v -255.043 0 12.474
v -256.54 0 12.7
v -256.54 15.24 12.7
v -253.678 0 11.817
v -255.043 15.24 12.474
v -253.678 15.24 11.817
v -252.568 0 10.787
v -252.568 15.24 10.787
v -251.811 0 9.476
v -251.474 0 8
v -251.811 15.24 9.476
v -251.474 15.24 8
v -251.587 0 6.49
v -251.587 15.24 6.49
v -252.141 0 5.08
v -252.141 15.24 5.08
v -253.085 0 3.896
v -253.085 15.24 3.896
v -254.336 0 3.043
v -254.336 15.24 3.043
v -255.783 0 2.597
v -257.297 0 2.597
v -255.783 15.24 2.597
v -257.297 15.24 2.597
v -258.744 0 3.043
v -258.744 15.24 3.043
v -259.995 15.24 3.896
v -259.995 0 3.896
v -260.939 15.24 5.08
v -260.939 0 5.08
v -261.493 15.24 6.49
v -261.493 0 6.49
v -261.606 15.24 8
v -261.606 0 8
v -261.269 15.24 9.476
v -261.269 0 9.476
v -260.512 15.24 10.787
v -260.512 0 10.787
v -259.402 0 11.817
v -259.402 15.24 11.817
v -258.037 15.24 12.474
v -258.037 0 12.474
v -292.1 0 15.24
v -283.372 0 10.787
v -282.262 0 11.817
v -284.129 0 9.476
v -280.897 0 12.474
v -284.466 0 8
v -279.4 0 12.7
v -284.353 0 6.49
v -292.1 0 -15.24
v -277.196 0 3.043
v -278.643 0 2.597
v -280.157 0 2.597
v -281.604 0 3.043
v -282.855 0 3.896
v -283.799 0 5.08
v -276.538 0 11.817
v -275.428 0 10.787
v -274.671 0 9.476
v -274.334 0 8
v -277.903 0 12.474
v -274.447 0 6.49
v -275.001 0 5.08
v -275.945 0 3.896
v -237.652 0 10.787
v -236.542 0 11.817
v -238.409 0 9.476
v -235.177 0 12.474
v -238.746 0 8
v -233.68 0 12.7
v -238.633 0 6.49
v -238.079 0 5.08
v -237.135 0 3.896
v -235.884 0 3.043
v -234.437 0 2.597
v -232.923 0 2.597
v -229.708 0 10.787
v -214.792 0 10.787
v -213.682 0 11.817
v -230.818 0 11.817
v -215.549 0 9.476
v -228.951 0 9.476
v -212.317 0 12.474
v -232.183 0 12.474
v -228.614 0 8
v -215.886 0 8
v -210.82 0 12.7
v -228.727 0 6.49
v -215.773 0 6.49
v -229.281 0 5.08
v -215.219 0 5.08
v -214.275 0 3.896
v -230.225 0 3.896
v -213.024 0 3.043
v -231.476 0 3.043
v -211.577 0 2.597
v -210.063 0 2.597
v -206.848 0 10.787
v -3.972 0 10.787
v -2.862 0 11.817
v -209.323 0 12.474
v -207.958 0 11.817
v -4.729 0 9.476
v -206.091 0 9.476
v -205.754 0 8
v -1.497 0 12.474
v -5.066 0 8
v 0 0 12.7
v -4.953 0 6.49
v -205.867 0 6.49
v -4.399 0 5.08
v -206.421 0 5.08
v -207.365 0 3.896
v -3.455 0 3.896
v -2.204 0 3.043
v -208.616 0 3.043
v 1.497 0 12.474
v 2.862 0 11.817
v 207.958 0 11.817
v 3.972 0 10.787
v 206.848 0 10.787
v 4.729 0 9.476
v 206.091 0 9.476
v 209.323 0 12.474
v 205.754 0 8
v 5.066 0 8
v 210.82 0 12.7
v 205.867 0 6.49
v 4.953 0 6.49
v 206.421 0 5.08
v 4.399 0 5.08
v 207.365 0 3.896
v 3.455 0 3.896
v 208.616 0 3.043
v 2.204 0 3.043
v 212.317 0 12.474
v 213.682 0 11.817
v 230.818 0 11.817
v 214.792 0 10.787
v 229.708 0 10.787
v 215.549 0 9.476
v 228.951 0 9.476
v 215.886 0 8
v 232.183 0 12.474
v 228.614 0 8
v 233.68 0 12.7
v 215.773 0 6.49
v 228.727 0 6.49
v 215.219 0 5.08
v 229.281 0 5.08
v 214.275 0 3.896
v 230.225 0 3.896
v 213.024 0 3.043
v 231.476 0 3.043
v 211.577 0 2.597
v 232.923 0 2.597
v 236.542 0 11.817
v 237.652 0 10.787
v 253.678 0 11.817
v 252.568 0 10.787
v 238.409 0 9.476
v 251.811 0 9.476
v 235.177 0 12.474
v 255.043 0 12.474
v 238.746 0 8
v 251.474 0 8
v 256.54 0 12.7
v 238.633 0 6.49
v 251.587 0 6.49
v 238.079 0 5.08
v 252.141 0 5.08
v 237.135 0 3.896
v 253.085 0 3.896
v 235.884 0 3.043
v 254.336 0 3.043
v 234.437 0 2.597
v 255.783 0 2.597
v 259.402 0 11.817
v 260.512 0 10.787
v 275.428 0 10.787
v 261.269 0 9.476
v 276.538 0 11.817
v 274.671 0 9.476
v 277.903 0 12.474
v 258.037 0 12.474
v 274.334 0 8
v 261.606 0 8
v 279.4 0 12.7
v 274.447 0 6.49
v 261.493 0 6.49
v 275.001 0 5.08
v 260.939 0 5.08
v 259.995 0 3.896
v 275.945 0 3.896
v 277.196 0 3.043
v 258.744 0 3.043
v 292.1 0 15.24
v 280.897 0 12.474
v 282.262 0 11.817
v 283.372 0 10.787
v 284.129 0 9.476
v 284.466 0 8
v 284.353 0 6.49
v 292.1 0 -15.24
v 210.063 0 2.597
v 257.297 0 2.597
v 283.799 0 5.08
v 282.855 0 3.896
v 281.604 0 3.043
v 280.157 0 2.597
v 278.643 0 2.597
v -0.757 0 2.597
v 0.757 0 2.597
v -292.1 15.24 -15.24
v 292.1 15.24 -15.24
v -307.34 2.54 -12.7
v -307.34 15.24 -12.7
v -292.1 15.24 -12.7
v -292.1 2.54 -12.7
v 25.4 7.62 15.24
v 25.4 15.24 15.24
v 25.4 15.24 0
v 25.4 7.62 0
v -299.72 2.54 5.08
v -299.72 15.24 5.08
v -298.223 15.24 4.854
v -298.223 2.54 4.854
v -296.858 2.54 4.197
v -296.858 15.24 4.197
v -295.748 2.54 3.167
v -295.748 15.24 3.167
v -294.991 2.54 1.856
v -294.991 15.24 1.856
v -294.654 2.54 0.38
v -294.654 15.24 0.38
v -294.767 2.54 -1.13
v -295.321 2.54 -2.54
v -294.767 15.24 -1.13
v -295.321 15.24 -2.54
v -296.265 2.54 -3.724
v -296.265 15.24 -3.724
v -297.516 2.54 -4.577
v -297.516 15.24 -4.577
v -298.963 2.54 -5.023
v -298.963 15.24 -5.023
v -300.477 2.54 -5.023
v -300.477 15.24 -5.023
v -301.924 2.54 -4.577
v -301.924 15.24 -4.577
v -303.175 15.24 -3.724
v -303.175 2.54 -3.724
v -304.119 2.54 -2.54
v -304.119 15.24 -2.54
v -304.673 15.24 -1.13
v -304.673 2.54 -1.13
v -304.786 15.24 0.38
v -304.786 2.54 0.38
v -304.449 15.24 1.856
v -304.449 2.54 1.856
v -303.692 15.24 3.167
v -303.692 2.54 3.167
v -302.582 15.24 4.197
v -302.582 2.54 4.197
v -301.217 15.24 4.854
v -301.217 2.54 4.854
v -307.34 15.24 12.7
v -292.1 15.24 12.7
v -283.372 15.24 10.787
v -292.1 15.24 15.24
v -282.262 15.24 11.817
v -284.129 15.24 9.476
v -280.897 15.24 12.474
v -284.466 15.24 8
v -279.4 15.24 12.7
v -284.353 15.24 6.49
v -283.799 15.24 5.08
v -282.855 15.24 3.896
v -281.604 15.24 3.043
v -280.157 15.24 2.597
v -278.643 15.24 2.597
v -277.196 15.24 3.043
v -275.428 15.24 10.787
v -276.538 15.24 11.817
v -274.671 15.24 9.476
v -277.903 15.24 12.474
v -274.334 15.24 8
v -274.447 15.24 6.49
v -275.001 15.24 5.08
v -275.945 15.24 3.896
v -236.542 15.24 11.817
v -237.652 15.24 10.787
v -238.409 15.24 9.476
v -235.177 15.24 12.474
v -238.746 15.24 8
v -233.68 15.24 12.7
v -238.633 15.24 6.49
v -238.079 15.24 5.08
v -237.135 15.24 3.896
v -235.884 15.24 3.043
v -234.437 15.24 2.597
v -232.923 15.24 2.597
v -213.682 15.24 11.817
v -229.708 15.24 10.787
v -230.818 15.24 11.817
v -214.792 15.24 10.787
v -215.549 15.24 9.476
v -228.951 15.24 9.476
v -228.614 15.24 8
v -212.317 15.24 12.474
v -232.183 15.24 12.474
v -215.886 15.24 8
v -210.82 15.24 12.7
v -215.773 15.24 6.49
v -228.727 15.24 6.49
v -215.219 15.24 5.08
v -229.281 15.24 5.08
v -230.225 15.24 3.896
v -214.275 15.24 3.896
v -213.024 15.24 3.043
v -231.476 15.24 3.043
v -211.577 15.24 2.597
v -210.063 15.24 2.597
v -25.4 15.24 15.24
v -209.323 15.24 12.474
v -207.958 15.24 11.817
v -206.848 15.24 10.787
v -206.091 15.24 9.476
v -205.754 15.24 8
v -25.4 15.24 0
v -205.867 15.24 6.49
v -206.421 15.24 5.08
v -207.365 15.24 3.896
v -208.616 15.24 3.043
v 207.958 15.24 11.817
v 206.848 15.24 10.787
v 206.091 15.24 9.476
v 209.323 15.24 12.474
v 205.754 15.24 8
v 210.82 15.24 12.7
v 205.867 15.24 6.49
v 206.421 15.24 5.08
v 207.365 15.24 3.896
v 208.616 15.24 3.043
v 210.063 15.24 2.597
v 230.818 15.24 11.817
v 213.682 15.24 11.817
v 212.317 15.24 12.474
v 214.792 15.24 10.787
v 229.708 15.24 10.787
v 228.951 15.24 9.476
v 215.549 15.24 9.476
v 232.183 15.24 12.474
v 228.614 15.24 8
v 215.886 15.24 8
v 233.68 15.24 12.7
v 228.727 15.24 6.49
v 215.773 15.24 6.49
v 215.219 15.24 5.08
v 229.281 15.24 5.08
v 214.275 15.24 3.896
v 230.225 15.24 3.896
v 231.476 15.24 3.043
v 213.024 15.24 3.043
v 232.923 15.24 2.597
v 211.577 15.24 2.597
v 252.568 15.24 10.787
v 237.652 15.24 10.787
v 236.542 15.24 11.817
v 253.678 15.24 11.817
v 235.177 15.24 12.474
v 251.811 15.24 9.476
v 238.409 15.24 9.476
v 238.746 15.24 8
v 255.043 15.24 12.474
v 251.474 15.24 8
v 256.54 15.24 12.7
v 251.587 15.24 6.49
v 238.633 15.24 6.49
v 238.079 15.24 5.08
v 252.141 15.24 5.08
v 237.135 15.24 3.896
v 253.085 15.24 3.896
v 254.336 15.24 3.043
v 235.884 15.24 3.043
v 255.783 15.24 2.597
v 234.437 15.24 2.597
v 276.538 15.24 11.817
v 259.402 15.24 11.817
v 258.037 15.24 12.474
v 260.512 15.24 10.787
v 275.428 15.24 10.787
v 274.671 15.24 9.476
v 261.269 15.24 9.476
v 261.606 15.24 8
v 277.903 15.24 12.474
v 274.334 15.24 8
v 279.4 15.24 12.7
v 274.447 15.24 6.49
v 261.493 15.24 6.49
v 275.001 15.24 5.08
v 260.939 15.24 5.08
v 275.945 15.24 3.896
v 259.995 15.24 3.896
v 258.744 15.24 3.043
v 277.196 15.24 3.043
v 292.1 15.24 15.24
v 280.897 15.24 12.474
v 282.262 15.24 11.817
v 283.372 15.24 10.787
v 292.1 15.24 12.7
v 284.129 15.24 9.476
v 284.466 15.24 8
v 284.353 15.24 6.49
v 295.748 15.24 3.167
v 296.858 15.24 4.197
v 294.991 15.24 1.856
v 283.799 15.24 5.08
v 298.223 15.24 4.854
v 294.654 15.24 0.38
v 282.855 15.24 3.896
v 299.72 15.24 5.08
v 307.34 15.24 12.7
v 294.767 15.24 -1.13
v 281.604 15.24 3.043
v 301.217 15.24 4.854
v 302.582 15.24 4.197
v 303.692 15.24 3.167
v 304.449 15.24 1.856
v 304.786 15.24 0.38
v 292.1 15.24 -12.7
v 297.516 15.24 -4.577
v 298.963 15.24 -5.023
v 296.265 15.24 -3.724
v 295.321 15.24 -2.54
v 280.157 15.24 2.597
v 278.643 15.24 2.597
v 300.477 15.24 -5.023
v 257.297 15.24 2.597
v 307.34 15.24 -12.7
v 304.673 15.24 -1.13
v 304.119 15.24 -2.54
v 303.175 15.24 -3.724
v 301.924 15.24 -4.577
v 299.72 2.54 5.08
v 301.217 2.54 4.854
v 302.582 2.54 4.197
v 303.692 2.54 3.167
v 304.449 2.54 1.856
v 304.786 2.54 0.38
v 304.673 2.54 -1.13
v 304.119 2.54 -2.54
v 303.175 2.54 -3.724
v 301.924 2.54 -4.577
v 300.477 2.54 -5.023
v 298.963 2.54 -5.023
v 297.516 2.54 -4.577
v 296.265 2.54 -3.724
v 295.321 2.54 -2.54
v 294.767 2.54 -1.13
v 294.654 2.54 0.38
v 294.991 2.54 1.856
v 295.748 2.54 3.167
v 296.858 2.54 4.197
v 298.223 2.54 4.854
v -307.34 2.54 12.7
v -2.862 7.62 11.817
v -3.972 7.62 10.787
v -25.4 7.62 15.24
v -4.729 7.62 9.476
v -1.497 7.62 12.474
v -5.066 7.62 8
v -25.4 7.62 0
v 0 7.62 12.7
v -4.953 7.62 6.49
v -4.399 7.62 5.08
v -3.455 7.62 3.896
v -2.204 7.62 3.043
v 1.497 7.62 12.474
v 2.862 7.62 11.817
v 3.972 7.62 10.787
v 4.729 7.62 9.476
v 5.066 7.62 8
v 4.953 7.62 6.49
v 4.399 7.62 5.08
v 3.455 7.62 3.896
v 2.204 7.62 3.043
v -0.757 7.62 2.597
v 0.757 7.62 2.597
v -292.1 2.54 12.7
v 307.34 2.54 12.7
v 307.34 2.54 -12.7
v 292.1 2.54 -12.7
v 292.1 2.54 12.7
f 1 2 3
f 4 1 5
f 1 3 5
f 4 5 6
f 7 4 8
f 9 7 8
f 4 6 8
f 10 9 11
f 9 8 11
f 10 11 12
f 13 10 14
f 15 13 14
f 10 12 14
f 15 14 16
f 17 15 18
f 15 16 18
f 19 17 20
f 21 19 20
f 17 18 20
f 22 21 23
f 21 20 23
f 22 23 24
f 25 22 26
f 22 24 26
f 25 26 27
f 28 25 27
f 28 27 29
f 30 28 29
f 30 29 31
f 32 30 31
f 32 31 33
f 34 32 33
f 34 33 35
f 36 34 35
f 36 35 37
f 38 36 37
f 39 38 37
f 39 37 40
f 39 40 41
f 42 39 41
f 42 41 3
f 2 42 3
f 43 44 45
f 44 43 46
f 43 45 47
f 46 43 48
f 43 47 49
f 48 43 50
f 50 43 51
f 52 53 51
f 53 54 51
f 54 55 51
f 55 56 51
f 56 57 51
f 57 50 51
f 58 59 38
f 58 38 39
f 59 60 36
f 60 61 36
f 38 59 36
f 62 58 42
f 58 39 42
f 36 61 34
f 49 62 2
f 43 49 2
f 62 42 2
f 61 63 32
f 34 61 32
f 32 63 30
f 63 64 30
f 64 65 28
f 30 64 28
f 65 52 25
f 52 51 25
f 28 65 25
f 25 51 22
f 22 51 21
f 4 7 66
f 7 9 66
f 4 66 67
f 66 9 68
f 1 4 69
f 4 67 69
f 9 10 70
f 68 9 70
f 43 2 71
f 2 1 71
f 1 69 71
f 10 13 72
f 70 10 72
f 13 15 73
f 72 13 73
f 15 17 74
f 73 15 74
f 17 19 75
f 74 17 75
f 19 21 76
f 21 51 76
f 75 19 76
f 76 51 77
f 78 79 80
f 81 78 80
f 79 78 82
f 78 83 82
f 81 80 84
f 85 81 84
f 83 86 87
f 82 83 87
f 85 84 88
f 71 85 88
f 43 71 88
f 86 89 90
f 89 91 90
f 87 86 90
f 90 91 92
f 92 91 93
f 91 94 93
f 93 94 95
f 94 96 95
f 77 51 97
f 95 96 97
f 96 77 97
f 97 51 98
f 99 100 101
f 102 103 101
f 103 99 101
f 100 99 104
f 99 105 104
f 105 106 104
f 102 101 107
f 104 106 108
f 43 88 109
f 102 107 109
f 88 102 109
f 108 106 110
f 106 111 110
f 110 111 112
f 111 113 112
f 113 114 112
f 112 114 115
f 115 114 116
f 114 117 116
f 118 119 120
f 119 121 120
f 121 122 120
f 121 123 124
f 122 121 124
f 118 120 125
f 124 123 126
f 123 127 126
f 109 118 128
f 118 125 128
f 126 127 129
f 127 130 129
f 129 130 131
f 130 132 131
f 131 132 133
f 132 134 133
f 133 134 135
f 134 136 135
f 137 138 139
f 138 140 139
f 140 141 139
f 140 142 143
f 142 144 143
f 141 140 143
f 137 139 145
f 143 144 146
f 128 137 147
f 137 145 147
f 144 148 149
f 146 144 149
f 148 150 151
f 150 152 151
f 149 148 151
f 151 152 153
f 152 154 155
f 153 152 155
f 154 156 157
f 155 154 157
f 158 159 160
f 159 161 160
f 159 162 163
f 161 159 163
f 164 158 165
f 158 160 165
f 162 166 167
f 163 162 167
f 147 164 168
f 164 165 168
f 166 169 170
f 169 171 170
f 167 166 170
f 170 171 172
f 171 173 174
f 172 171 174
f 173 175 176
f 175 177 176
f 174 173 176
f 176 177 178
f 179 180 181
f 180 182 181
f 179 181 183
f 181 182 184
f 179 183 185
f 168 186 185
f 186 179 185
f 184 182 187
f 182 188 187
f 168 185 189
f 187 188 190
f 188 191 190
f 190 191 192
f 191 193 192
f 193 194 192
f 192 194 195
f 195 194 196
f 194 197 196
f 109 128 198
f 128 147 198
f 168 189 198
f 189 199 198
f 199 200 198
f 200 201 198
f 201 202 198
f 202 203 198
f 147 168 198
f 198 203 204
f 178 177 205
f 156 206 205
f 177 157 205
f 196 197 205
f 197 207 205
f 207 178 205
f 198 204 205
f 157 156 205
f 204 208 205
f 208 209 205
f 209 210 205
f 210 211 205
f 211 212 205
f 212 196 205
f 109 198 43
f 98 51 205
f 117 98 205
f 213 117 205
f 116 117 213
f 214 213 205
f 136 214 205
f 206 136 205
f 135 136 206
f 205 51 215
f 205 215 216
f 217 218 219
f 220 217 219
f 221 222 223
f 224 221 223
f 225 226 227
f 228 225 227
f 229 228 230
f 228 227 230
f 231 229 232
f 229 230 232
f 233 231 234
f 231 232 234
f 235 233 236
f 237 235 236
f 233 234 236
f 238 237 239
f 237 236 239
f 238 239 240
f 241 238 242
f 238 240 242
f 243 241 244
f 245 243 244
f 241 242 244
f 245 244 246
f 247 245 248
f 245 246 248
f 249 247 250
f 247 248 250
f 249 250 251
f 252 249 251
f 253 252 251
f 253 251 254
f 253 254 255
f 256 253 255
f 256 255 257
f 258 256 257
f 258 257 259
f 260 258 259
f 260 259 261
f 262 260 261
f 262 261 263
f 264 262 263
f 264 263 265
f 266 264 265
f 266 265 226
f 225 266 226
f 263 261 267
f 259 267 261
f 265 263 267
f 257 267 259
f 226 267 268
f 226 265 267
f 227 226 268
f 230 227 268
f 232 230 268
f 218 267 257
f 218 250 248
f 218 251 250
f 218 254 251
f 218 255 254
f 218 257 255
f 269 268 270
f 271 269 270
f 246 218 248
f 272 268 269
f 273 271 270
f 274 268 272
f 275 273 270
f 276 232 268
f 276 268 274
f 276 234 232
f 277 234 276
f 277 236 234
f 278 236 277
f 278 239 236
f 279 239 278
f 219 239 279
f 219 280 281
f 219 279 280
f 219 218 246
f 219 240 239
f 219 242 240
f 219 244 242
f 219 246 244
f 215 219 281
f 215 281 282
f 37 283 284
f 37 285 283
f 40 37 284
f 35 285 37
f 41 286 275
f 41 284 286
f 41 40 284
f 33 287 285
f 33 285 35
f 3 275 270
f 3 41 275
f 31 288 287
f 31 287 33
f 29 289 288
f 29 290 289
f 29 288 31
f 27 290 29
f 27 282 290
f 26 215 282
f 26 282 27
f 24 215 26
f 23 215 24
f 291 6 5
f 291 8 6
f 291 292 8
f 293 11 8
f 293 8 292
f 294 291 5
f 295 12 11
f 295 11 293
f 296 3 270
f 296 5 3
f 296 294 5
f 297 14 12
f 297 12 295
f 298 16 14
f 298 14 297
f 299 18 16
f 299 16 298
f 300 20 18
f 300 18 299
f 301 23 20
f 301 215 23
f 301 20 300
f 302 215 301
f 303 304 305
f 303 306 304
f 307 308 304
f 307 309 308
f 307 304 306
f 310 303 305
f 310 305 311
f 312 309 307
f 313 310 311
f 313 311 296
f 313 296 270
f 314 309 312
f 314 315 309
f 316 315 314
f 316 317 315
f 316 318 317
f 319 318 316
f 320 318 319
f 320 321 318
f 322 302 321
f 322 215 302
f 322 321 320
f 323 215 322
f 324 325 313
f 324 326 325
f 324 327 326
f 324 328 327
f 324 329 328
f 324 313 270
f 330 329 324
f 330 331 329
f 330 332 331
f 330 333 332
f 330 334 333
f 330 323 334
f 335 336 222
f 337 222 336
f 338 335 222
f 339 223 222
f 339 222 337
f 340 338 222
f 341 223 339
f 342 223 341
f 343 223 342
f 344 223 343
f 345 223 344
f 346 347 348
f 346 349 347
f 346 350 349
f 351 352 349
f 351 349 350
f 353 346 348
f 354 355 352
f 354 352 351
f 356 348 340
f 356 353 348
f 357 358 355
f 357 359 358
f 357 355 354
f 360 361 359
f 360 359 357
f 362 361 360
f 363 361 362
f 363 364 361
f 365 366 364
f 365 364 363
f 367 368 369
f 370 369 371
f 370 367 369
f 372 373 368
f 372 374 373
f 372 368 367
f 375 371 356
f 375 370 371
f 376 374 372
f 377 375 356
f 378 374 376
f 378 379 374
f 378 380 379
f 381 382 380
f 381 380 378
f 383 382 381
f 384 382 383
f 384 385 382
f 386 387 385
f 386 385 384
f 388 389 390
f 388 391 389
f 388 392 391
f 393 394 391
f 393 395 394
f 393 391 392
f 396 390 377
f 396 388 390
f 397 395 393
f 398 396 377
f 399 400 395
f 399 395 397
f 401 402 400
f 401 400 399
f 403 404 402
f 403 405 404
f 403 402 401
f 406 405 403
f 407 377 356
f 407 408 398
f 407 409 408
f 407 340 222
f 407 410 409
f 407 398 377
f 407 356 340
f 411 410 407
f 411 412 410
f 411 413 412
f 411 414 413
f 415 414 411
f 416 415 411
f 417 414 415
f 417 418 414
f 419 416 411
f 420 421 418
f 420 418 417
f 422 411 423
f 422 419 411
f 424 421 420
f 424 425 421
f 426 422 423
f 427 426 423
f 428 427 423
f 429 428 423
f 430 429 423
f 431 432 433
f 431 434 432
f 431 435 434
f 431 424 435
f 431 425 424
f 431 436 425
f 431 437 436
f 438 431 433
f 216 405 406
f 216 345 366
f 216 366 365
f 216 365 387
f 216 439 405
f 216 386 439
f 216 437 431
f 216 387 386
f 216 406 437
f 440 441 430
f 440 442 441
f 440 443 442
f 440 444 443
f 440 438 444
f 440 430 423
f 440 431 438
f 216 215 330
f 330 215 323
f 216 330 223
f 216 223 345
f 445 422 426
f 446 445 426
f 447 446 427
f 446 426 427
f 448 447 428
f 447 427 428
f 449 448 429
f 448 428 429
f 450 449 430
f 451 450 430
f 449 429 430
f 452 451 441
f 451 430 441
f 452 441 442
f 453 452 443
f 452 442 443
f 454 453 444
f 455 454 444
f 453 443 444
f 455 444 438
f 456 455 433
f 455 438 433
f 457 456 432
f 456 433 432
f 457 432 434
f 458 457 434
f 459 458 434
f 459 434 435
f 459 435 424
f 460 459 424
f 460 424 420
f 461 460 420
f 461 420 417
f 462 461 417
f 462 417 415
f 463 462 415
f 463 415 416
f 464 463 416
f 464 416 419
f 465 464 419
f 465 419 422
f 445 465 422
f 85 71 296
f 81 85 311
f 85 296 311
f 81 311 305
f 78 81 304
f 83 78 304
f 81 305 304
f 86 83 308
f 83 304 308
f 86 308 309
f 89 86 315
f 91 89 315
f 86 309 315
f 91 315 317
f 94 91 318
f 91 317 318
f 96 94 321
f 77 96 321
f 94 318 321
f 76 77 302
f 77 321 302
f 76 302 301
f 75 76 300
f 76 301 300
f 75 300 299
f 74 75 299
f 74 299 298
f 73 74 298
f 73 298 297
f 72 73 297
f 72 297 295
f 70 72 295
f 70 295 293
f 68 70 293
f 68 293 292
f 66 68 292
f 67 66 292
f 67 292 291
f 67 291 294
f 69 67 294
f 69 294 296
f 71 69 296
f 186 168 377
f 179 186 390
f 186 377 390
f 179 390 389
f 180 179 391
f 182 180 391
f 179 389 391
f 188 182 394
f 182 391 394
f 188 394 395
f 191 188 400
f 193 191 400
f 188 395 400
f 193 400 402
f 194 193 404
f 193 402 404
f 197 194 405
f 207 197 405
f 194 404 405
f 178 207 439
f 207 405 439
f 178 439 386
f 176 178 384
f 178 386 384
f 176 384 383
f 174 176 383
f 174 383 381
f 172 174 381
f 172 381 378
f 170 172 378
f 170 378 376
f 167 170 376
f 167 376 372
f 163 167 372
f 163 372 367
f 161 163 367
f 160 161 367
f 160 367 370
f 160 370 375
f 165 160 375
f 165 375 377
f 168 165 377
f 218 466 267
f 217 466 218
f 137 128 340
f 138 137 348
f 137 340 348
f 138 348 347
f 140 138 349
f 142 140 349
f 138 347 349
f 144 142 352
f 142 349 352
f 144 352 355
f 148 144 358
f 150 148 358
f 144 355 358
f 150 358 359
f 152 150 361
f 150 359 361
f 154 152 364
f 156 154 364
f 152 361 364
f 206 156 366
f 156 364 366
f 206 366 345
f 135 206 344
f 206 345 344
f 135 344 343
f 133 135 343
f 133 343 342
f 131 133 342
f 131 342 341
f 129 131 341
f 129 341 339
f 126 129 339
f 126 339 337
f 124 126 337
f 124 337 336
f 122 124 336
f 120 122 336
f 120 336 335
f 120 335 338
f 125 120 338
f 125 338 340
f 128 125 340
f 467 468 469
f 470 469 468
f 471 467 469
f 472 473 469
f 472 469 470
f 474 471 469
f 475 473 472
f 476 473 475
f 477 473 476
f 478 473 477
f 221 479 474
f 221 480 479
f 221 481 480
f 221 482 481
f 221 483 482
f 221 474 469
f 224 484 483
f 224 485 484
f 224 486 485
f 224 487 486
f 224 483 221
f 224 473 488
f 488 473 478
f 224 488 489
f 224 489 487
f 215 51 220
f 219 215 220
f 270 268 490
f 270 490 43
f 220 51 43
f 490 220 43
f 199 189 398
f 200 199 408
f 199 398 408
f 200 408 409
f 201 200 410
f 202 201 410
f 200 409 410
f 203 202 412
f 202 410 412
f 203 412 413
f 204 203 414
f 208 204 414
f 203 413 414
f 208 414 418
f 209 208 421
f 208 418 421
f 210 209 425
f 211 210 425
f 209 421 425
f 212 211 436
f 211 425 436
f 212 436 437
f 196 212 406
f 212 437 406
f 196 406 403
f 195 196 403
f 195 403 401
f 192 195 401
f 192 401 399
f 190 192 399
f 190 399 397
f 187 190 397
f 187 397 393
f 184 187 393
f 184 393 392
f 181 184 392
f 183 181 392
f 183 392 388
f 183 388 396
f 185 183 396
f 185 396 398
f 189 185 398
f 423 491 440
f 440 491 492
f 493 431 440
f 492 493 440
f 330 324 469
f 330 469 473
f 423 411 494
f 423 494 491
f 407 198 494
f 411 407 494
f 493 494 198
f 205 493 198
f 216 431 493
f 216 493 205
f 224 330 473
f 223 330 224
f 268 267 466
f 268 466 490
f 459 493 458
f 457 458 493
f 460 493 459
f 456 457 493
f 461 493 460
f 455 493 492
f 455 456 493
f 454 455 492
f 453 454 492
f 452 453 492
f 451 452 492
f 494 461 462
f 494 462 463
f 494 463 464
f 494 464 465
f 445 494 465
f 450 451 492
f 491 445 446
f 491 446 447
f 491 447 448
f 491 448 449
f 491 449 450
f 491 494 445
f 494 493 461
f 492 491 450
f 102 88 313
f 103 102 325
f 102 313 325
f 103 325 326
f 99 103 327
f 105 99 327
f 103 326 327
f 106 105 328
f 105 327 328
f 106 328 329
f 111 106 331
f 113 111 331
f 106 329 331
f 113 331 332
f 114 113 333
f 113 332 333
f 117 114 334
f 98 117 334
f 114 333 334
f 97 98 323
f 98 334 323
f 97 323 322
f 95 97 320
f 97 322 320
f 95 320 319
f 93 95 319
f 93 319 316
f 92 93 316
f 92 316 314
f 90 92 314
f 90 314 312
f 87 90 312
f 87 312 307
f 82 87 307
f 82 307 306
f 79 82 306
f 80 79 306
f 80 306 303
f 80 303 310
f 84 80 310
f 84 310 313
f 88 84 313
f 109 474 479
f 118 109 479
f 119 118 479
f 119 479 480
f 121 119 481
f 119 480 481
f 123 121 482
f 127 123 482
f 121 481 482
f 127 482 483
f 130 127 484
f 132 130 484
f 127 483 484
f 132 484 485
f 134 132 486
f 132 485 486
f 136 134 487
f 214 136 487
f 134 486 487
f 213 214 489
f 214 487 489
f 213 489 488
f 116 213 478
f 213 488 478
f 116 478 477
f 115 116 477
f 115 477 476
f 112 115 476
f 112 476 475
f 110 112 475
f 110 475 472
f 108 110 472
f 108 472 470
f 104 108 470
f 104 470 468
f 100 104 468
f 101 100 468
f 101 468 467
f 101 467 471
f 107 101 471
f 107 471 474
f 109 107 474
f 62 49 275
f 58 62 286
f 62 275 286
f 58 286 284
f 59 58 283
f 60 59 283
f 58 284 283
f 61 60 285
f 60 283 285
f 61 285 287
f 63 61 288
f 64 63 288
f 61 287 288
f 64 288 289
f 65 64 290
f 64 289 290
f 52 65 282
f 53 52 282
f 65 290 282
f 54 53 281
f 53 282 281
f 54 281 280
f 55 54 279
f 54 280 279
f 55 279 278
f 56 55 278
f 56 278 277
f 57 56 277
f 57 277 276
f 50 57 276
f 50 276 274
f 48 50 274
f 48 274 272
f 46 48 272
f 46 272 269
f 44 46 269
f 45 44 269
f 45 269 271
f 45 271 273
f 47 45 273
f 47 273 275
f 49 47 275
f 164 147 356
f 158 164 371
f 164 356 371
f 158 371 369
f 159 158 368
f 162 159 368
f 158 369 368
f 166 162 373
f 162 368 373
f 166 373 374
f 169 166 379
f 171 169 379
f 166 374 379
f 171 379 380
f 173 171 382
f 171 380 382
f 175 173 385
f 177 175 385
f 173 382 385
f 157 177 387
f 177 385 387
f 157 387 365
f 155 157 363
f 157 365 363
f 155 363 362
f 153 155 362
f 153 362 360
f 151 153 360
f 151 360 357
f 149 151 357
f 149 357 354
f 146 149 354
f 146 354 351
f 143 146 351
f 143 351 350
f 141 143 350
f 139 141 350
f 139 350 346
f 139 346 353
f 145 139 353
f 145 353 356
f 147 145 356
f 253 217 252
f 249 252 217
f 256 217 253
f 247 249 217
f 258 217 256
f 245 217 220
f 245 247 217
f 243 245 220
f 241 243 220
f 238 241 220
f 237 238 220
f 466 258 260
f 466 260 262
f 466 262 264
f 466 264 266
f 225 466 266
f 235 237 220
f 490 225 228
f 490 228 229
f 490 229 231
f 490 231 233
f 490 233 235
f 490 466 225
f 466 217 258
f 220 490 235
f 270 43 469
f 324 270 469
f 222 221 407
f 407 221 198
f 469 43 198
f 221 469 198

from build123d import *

# Parameters (mm, degrees)
SKETCH1_W           = 614.68
SKETCH1_H           = 30.48
BOSS_EXTRUDE1_DEPTH = 15.24
SKETCH2_W           = 15.24
SKETCH2_H           = 2.54
CUT_EXTRUDE1_DEPTH  = 15.24
SKETCH3_W           = 15.24
SKETCH3_H           = 25.4
CUT_EXTRUDE2_DEPTH  = 2.54
SKETCH4_R           = 5.08
CUT_EXTRUDE3_DEPTH  = 17.78
SKETCH5_W           = 50.8
SKETCH5_H           = 15.24
CUT_EXTRUDE4_DEPTH  = 7.62
SKETCH6_R           = 5.08
CUT_EXTRUDE5_DEPTH  = 12.7
SKETCH7_R           = 5.08
CUT_EXTRUDE6_DEPTH  = 17.78


with BuildPart() as part:
    # Sketch1 → Boss-Extrude1 (new body)
    with BuildSketch(Plane(origin=(0, 0, 0), x_dir=(1, 0, 0), z_dir=(0, 1, 0))):
        Rectangle(SKETCH1_W, SKETCH1_H)
    extrude(amount=BOSS_EXTRUDE1_DEPTH)

    # Sketch2 → Cut-Extrude1 (cut)
    with BuildSketch(Plane(origin=(0, 15.24, 0), x_dir=(1, 0, 0), z_dir=(0, 1, 0))):
        with Locations((-299.72, 13.97)):
            Rectangle(SKETCH2_W, SKETCH2_H)
        with Locations((-299.72, -13.97)):
            Rectangle(SKETCH2_W, SKETCH2_H)
        with Locations((299.72, 13.97)):
            Rectangle(SKETCH2_W, SKETCH2_H)
        with Locations((299.72, -13.97)):
            Rectangle(SKETCH2_W, SKETCH2_H)
    extrude(amount=-CUT_EXTRUDE1_DEPTH, mode=Mode.SUBTRACT)

    # Sketch3 → Cut-Extrude2 (cut)
    with BuildSketch(Plane.XZ):
        with Locations((299.72, 0)):
            Rectangle(SKETCH3_W, SKETCH3_H)
        with Locations((-299.72, 0)):
            Rectangle(SKETCH3_W, SKETCH3_H)
    extrude(amount=-CUT_EXTRUDE2_DEPTH, mode=Mode.SUBTRACT)

    # Sketch4 → Cut-Extrude3 (cut)
    with BuildSketch(Plane(origin=(0, 15.24, 0), x_dir=(1, 0, 0), z_dir=(0, 1, 0))):
        with Locations(Location((-299.72, 0, 0), (0, 0, 270))):
            Circle(SKETCH4_R)
        with Locations(Location((299.72, 0, 0), (0, 0, 270))):
            Circle(SKETCH4_R)
    extrude(amount=-CUT_EXTRUDE3_DEPTH, mode=Mode.SUBTRACT)

    # Sketch5 → Cut-Extrude4 (cut)
    with BuildSketch(Plane(origin=(0, 15.24, 0), x_dir=(1, 0, 0), z_dir=(0, 1, 0))):
        with Locations((0, -7.62)):
            Rectangle(SKETCH5_W, SKETCH5_H)
    extrude(amount=-CUT_EXTRUDE4_DEPTH, mode=Mode.SUBTRACT)

    # Sketch6 → Cut-Extrude5 (cut)
    with BuildSketch(Plane(origin=(0, 7.62, 0), x_dir=(1, 0, 0), z_dir=(0, 1, 0))):
        with Locations(Location((0, -7.62, 0), (0, 0, 270))):
            Circle(SKETCH6_R)
    extrude(amount=-CUT_EXTRUDE5_DEPTH, mode=Mode.SUBTRACT)

    # Sketch7 → Cut-Extrude6 (cut)
    with BuildSketch(Plane(origin=(0, 15.24, 0), x_dir=(1, 0, 0), z_dir=(0, 1, 0))):
        with Locations(Location((-279.4, -7.62, 0), (0, 0, 270))):
            Circle(SKETCH7_R)
        with Locations(Location((-256.54, -7.62, 0), (0, 0, 270))):
            Circle(SKETCH7_R)
        with Locations(Location((-233.68, -7.62, 0), (0, 0, 270))):
            Circle(SKETCH7_R)
        with Locations(Location((-210.82, -7.62, 0), (0, 0, 270))):
            Circle(SKETCH7_R)
        with Locations(Location((279.4, -7.62, 0), (0, 0, 270))):
            Circle(SKETCH7_R)
        with Locations(Location((256.54, -7.62, 0), (0, 0, 270))):
            Circle(SKETCH7_R)
        with Locations(Location((233.68, -7.62, 0), (0, 0, 270))):
            Circle(SKETCH7_R)
        with Locations(Location((210.82, -7.62, 0), (0, 0, 270))):
            Circle(SKETCH7_R)
    extrude(amount=-CUT_EXTRUDE6_DEPTH, mode=Mode.SUBTRACT)


solid = part.part
